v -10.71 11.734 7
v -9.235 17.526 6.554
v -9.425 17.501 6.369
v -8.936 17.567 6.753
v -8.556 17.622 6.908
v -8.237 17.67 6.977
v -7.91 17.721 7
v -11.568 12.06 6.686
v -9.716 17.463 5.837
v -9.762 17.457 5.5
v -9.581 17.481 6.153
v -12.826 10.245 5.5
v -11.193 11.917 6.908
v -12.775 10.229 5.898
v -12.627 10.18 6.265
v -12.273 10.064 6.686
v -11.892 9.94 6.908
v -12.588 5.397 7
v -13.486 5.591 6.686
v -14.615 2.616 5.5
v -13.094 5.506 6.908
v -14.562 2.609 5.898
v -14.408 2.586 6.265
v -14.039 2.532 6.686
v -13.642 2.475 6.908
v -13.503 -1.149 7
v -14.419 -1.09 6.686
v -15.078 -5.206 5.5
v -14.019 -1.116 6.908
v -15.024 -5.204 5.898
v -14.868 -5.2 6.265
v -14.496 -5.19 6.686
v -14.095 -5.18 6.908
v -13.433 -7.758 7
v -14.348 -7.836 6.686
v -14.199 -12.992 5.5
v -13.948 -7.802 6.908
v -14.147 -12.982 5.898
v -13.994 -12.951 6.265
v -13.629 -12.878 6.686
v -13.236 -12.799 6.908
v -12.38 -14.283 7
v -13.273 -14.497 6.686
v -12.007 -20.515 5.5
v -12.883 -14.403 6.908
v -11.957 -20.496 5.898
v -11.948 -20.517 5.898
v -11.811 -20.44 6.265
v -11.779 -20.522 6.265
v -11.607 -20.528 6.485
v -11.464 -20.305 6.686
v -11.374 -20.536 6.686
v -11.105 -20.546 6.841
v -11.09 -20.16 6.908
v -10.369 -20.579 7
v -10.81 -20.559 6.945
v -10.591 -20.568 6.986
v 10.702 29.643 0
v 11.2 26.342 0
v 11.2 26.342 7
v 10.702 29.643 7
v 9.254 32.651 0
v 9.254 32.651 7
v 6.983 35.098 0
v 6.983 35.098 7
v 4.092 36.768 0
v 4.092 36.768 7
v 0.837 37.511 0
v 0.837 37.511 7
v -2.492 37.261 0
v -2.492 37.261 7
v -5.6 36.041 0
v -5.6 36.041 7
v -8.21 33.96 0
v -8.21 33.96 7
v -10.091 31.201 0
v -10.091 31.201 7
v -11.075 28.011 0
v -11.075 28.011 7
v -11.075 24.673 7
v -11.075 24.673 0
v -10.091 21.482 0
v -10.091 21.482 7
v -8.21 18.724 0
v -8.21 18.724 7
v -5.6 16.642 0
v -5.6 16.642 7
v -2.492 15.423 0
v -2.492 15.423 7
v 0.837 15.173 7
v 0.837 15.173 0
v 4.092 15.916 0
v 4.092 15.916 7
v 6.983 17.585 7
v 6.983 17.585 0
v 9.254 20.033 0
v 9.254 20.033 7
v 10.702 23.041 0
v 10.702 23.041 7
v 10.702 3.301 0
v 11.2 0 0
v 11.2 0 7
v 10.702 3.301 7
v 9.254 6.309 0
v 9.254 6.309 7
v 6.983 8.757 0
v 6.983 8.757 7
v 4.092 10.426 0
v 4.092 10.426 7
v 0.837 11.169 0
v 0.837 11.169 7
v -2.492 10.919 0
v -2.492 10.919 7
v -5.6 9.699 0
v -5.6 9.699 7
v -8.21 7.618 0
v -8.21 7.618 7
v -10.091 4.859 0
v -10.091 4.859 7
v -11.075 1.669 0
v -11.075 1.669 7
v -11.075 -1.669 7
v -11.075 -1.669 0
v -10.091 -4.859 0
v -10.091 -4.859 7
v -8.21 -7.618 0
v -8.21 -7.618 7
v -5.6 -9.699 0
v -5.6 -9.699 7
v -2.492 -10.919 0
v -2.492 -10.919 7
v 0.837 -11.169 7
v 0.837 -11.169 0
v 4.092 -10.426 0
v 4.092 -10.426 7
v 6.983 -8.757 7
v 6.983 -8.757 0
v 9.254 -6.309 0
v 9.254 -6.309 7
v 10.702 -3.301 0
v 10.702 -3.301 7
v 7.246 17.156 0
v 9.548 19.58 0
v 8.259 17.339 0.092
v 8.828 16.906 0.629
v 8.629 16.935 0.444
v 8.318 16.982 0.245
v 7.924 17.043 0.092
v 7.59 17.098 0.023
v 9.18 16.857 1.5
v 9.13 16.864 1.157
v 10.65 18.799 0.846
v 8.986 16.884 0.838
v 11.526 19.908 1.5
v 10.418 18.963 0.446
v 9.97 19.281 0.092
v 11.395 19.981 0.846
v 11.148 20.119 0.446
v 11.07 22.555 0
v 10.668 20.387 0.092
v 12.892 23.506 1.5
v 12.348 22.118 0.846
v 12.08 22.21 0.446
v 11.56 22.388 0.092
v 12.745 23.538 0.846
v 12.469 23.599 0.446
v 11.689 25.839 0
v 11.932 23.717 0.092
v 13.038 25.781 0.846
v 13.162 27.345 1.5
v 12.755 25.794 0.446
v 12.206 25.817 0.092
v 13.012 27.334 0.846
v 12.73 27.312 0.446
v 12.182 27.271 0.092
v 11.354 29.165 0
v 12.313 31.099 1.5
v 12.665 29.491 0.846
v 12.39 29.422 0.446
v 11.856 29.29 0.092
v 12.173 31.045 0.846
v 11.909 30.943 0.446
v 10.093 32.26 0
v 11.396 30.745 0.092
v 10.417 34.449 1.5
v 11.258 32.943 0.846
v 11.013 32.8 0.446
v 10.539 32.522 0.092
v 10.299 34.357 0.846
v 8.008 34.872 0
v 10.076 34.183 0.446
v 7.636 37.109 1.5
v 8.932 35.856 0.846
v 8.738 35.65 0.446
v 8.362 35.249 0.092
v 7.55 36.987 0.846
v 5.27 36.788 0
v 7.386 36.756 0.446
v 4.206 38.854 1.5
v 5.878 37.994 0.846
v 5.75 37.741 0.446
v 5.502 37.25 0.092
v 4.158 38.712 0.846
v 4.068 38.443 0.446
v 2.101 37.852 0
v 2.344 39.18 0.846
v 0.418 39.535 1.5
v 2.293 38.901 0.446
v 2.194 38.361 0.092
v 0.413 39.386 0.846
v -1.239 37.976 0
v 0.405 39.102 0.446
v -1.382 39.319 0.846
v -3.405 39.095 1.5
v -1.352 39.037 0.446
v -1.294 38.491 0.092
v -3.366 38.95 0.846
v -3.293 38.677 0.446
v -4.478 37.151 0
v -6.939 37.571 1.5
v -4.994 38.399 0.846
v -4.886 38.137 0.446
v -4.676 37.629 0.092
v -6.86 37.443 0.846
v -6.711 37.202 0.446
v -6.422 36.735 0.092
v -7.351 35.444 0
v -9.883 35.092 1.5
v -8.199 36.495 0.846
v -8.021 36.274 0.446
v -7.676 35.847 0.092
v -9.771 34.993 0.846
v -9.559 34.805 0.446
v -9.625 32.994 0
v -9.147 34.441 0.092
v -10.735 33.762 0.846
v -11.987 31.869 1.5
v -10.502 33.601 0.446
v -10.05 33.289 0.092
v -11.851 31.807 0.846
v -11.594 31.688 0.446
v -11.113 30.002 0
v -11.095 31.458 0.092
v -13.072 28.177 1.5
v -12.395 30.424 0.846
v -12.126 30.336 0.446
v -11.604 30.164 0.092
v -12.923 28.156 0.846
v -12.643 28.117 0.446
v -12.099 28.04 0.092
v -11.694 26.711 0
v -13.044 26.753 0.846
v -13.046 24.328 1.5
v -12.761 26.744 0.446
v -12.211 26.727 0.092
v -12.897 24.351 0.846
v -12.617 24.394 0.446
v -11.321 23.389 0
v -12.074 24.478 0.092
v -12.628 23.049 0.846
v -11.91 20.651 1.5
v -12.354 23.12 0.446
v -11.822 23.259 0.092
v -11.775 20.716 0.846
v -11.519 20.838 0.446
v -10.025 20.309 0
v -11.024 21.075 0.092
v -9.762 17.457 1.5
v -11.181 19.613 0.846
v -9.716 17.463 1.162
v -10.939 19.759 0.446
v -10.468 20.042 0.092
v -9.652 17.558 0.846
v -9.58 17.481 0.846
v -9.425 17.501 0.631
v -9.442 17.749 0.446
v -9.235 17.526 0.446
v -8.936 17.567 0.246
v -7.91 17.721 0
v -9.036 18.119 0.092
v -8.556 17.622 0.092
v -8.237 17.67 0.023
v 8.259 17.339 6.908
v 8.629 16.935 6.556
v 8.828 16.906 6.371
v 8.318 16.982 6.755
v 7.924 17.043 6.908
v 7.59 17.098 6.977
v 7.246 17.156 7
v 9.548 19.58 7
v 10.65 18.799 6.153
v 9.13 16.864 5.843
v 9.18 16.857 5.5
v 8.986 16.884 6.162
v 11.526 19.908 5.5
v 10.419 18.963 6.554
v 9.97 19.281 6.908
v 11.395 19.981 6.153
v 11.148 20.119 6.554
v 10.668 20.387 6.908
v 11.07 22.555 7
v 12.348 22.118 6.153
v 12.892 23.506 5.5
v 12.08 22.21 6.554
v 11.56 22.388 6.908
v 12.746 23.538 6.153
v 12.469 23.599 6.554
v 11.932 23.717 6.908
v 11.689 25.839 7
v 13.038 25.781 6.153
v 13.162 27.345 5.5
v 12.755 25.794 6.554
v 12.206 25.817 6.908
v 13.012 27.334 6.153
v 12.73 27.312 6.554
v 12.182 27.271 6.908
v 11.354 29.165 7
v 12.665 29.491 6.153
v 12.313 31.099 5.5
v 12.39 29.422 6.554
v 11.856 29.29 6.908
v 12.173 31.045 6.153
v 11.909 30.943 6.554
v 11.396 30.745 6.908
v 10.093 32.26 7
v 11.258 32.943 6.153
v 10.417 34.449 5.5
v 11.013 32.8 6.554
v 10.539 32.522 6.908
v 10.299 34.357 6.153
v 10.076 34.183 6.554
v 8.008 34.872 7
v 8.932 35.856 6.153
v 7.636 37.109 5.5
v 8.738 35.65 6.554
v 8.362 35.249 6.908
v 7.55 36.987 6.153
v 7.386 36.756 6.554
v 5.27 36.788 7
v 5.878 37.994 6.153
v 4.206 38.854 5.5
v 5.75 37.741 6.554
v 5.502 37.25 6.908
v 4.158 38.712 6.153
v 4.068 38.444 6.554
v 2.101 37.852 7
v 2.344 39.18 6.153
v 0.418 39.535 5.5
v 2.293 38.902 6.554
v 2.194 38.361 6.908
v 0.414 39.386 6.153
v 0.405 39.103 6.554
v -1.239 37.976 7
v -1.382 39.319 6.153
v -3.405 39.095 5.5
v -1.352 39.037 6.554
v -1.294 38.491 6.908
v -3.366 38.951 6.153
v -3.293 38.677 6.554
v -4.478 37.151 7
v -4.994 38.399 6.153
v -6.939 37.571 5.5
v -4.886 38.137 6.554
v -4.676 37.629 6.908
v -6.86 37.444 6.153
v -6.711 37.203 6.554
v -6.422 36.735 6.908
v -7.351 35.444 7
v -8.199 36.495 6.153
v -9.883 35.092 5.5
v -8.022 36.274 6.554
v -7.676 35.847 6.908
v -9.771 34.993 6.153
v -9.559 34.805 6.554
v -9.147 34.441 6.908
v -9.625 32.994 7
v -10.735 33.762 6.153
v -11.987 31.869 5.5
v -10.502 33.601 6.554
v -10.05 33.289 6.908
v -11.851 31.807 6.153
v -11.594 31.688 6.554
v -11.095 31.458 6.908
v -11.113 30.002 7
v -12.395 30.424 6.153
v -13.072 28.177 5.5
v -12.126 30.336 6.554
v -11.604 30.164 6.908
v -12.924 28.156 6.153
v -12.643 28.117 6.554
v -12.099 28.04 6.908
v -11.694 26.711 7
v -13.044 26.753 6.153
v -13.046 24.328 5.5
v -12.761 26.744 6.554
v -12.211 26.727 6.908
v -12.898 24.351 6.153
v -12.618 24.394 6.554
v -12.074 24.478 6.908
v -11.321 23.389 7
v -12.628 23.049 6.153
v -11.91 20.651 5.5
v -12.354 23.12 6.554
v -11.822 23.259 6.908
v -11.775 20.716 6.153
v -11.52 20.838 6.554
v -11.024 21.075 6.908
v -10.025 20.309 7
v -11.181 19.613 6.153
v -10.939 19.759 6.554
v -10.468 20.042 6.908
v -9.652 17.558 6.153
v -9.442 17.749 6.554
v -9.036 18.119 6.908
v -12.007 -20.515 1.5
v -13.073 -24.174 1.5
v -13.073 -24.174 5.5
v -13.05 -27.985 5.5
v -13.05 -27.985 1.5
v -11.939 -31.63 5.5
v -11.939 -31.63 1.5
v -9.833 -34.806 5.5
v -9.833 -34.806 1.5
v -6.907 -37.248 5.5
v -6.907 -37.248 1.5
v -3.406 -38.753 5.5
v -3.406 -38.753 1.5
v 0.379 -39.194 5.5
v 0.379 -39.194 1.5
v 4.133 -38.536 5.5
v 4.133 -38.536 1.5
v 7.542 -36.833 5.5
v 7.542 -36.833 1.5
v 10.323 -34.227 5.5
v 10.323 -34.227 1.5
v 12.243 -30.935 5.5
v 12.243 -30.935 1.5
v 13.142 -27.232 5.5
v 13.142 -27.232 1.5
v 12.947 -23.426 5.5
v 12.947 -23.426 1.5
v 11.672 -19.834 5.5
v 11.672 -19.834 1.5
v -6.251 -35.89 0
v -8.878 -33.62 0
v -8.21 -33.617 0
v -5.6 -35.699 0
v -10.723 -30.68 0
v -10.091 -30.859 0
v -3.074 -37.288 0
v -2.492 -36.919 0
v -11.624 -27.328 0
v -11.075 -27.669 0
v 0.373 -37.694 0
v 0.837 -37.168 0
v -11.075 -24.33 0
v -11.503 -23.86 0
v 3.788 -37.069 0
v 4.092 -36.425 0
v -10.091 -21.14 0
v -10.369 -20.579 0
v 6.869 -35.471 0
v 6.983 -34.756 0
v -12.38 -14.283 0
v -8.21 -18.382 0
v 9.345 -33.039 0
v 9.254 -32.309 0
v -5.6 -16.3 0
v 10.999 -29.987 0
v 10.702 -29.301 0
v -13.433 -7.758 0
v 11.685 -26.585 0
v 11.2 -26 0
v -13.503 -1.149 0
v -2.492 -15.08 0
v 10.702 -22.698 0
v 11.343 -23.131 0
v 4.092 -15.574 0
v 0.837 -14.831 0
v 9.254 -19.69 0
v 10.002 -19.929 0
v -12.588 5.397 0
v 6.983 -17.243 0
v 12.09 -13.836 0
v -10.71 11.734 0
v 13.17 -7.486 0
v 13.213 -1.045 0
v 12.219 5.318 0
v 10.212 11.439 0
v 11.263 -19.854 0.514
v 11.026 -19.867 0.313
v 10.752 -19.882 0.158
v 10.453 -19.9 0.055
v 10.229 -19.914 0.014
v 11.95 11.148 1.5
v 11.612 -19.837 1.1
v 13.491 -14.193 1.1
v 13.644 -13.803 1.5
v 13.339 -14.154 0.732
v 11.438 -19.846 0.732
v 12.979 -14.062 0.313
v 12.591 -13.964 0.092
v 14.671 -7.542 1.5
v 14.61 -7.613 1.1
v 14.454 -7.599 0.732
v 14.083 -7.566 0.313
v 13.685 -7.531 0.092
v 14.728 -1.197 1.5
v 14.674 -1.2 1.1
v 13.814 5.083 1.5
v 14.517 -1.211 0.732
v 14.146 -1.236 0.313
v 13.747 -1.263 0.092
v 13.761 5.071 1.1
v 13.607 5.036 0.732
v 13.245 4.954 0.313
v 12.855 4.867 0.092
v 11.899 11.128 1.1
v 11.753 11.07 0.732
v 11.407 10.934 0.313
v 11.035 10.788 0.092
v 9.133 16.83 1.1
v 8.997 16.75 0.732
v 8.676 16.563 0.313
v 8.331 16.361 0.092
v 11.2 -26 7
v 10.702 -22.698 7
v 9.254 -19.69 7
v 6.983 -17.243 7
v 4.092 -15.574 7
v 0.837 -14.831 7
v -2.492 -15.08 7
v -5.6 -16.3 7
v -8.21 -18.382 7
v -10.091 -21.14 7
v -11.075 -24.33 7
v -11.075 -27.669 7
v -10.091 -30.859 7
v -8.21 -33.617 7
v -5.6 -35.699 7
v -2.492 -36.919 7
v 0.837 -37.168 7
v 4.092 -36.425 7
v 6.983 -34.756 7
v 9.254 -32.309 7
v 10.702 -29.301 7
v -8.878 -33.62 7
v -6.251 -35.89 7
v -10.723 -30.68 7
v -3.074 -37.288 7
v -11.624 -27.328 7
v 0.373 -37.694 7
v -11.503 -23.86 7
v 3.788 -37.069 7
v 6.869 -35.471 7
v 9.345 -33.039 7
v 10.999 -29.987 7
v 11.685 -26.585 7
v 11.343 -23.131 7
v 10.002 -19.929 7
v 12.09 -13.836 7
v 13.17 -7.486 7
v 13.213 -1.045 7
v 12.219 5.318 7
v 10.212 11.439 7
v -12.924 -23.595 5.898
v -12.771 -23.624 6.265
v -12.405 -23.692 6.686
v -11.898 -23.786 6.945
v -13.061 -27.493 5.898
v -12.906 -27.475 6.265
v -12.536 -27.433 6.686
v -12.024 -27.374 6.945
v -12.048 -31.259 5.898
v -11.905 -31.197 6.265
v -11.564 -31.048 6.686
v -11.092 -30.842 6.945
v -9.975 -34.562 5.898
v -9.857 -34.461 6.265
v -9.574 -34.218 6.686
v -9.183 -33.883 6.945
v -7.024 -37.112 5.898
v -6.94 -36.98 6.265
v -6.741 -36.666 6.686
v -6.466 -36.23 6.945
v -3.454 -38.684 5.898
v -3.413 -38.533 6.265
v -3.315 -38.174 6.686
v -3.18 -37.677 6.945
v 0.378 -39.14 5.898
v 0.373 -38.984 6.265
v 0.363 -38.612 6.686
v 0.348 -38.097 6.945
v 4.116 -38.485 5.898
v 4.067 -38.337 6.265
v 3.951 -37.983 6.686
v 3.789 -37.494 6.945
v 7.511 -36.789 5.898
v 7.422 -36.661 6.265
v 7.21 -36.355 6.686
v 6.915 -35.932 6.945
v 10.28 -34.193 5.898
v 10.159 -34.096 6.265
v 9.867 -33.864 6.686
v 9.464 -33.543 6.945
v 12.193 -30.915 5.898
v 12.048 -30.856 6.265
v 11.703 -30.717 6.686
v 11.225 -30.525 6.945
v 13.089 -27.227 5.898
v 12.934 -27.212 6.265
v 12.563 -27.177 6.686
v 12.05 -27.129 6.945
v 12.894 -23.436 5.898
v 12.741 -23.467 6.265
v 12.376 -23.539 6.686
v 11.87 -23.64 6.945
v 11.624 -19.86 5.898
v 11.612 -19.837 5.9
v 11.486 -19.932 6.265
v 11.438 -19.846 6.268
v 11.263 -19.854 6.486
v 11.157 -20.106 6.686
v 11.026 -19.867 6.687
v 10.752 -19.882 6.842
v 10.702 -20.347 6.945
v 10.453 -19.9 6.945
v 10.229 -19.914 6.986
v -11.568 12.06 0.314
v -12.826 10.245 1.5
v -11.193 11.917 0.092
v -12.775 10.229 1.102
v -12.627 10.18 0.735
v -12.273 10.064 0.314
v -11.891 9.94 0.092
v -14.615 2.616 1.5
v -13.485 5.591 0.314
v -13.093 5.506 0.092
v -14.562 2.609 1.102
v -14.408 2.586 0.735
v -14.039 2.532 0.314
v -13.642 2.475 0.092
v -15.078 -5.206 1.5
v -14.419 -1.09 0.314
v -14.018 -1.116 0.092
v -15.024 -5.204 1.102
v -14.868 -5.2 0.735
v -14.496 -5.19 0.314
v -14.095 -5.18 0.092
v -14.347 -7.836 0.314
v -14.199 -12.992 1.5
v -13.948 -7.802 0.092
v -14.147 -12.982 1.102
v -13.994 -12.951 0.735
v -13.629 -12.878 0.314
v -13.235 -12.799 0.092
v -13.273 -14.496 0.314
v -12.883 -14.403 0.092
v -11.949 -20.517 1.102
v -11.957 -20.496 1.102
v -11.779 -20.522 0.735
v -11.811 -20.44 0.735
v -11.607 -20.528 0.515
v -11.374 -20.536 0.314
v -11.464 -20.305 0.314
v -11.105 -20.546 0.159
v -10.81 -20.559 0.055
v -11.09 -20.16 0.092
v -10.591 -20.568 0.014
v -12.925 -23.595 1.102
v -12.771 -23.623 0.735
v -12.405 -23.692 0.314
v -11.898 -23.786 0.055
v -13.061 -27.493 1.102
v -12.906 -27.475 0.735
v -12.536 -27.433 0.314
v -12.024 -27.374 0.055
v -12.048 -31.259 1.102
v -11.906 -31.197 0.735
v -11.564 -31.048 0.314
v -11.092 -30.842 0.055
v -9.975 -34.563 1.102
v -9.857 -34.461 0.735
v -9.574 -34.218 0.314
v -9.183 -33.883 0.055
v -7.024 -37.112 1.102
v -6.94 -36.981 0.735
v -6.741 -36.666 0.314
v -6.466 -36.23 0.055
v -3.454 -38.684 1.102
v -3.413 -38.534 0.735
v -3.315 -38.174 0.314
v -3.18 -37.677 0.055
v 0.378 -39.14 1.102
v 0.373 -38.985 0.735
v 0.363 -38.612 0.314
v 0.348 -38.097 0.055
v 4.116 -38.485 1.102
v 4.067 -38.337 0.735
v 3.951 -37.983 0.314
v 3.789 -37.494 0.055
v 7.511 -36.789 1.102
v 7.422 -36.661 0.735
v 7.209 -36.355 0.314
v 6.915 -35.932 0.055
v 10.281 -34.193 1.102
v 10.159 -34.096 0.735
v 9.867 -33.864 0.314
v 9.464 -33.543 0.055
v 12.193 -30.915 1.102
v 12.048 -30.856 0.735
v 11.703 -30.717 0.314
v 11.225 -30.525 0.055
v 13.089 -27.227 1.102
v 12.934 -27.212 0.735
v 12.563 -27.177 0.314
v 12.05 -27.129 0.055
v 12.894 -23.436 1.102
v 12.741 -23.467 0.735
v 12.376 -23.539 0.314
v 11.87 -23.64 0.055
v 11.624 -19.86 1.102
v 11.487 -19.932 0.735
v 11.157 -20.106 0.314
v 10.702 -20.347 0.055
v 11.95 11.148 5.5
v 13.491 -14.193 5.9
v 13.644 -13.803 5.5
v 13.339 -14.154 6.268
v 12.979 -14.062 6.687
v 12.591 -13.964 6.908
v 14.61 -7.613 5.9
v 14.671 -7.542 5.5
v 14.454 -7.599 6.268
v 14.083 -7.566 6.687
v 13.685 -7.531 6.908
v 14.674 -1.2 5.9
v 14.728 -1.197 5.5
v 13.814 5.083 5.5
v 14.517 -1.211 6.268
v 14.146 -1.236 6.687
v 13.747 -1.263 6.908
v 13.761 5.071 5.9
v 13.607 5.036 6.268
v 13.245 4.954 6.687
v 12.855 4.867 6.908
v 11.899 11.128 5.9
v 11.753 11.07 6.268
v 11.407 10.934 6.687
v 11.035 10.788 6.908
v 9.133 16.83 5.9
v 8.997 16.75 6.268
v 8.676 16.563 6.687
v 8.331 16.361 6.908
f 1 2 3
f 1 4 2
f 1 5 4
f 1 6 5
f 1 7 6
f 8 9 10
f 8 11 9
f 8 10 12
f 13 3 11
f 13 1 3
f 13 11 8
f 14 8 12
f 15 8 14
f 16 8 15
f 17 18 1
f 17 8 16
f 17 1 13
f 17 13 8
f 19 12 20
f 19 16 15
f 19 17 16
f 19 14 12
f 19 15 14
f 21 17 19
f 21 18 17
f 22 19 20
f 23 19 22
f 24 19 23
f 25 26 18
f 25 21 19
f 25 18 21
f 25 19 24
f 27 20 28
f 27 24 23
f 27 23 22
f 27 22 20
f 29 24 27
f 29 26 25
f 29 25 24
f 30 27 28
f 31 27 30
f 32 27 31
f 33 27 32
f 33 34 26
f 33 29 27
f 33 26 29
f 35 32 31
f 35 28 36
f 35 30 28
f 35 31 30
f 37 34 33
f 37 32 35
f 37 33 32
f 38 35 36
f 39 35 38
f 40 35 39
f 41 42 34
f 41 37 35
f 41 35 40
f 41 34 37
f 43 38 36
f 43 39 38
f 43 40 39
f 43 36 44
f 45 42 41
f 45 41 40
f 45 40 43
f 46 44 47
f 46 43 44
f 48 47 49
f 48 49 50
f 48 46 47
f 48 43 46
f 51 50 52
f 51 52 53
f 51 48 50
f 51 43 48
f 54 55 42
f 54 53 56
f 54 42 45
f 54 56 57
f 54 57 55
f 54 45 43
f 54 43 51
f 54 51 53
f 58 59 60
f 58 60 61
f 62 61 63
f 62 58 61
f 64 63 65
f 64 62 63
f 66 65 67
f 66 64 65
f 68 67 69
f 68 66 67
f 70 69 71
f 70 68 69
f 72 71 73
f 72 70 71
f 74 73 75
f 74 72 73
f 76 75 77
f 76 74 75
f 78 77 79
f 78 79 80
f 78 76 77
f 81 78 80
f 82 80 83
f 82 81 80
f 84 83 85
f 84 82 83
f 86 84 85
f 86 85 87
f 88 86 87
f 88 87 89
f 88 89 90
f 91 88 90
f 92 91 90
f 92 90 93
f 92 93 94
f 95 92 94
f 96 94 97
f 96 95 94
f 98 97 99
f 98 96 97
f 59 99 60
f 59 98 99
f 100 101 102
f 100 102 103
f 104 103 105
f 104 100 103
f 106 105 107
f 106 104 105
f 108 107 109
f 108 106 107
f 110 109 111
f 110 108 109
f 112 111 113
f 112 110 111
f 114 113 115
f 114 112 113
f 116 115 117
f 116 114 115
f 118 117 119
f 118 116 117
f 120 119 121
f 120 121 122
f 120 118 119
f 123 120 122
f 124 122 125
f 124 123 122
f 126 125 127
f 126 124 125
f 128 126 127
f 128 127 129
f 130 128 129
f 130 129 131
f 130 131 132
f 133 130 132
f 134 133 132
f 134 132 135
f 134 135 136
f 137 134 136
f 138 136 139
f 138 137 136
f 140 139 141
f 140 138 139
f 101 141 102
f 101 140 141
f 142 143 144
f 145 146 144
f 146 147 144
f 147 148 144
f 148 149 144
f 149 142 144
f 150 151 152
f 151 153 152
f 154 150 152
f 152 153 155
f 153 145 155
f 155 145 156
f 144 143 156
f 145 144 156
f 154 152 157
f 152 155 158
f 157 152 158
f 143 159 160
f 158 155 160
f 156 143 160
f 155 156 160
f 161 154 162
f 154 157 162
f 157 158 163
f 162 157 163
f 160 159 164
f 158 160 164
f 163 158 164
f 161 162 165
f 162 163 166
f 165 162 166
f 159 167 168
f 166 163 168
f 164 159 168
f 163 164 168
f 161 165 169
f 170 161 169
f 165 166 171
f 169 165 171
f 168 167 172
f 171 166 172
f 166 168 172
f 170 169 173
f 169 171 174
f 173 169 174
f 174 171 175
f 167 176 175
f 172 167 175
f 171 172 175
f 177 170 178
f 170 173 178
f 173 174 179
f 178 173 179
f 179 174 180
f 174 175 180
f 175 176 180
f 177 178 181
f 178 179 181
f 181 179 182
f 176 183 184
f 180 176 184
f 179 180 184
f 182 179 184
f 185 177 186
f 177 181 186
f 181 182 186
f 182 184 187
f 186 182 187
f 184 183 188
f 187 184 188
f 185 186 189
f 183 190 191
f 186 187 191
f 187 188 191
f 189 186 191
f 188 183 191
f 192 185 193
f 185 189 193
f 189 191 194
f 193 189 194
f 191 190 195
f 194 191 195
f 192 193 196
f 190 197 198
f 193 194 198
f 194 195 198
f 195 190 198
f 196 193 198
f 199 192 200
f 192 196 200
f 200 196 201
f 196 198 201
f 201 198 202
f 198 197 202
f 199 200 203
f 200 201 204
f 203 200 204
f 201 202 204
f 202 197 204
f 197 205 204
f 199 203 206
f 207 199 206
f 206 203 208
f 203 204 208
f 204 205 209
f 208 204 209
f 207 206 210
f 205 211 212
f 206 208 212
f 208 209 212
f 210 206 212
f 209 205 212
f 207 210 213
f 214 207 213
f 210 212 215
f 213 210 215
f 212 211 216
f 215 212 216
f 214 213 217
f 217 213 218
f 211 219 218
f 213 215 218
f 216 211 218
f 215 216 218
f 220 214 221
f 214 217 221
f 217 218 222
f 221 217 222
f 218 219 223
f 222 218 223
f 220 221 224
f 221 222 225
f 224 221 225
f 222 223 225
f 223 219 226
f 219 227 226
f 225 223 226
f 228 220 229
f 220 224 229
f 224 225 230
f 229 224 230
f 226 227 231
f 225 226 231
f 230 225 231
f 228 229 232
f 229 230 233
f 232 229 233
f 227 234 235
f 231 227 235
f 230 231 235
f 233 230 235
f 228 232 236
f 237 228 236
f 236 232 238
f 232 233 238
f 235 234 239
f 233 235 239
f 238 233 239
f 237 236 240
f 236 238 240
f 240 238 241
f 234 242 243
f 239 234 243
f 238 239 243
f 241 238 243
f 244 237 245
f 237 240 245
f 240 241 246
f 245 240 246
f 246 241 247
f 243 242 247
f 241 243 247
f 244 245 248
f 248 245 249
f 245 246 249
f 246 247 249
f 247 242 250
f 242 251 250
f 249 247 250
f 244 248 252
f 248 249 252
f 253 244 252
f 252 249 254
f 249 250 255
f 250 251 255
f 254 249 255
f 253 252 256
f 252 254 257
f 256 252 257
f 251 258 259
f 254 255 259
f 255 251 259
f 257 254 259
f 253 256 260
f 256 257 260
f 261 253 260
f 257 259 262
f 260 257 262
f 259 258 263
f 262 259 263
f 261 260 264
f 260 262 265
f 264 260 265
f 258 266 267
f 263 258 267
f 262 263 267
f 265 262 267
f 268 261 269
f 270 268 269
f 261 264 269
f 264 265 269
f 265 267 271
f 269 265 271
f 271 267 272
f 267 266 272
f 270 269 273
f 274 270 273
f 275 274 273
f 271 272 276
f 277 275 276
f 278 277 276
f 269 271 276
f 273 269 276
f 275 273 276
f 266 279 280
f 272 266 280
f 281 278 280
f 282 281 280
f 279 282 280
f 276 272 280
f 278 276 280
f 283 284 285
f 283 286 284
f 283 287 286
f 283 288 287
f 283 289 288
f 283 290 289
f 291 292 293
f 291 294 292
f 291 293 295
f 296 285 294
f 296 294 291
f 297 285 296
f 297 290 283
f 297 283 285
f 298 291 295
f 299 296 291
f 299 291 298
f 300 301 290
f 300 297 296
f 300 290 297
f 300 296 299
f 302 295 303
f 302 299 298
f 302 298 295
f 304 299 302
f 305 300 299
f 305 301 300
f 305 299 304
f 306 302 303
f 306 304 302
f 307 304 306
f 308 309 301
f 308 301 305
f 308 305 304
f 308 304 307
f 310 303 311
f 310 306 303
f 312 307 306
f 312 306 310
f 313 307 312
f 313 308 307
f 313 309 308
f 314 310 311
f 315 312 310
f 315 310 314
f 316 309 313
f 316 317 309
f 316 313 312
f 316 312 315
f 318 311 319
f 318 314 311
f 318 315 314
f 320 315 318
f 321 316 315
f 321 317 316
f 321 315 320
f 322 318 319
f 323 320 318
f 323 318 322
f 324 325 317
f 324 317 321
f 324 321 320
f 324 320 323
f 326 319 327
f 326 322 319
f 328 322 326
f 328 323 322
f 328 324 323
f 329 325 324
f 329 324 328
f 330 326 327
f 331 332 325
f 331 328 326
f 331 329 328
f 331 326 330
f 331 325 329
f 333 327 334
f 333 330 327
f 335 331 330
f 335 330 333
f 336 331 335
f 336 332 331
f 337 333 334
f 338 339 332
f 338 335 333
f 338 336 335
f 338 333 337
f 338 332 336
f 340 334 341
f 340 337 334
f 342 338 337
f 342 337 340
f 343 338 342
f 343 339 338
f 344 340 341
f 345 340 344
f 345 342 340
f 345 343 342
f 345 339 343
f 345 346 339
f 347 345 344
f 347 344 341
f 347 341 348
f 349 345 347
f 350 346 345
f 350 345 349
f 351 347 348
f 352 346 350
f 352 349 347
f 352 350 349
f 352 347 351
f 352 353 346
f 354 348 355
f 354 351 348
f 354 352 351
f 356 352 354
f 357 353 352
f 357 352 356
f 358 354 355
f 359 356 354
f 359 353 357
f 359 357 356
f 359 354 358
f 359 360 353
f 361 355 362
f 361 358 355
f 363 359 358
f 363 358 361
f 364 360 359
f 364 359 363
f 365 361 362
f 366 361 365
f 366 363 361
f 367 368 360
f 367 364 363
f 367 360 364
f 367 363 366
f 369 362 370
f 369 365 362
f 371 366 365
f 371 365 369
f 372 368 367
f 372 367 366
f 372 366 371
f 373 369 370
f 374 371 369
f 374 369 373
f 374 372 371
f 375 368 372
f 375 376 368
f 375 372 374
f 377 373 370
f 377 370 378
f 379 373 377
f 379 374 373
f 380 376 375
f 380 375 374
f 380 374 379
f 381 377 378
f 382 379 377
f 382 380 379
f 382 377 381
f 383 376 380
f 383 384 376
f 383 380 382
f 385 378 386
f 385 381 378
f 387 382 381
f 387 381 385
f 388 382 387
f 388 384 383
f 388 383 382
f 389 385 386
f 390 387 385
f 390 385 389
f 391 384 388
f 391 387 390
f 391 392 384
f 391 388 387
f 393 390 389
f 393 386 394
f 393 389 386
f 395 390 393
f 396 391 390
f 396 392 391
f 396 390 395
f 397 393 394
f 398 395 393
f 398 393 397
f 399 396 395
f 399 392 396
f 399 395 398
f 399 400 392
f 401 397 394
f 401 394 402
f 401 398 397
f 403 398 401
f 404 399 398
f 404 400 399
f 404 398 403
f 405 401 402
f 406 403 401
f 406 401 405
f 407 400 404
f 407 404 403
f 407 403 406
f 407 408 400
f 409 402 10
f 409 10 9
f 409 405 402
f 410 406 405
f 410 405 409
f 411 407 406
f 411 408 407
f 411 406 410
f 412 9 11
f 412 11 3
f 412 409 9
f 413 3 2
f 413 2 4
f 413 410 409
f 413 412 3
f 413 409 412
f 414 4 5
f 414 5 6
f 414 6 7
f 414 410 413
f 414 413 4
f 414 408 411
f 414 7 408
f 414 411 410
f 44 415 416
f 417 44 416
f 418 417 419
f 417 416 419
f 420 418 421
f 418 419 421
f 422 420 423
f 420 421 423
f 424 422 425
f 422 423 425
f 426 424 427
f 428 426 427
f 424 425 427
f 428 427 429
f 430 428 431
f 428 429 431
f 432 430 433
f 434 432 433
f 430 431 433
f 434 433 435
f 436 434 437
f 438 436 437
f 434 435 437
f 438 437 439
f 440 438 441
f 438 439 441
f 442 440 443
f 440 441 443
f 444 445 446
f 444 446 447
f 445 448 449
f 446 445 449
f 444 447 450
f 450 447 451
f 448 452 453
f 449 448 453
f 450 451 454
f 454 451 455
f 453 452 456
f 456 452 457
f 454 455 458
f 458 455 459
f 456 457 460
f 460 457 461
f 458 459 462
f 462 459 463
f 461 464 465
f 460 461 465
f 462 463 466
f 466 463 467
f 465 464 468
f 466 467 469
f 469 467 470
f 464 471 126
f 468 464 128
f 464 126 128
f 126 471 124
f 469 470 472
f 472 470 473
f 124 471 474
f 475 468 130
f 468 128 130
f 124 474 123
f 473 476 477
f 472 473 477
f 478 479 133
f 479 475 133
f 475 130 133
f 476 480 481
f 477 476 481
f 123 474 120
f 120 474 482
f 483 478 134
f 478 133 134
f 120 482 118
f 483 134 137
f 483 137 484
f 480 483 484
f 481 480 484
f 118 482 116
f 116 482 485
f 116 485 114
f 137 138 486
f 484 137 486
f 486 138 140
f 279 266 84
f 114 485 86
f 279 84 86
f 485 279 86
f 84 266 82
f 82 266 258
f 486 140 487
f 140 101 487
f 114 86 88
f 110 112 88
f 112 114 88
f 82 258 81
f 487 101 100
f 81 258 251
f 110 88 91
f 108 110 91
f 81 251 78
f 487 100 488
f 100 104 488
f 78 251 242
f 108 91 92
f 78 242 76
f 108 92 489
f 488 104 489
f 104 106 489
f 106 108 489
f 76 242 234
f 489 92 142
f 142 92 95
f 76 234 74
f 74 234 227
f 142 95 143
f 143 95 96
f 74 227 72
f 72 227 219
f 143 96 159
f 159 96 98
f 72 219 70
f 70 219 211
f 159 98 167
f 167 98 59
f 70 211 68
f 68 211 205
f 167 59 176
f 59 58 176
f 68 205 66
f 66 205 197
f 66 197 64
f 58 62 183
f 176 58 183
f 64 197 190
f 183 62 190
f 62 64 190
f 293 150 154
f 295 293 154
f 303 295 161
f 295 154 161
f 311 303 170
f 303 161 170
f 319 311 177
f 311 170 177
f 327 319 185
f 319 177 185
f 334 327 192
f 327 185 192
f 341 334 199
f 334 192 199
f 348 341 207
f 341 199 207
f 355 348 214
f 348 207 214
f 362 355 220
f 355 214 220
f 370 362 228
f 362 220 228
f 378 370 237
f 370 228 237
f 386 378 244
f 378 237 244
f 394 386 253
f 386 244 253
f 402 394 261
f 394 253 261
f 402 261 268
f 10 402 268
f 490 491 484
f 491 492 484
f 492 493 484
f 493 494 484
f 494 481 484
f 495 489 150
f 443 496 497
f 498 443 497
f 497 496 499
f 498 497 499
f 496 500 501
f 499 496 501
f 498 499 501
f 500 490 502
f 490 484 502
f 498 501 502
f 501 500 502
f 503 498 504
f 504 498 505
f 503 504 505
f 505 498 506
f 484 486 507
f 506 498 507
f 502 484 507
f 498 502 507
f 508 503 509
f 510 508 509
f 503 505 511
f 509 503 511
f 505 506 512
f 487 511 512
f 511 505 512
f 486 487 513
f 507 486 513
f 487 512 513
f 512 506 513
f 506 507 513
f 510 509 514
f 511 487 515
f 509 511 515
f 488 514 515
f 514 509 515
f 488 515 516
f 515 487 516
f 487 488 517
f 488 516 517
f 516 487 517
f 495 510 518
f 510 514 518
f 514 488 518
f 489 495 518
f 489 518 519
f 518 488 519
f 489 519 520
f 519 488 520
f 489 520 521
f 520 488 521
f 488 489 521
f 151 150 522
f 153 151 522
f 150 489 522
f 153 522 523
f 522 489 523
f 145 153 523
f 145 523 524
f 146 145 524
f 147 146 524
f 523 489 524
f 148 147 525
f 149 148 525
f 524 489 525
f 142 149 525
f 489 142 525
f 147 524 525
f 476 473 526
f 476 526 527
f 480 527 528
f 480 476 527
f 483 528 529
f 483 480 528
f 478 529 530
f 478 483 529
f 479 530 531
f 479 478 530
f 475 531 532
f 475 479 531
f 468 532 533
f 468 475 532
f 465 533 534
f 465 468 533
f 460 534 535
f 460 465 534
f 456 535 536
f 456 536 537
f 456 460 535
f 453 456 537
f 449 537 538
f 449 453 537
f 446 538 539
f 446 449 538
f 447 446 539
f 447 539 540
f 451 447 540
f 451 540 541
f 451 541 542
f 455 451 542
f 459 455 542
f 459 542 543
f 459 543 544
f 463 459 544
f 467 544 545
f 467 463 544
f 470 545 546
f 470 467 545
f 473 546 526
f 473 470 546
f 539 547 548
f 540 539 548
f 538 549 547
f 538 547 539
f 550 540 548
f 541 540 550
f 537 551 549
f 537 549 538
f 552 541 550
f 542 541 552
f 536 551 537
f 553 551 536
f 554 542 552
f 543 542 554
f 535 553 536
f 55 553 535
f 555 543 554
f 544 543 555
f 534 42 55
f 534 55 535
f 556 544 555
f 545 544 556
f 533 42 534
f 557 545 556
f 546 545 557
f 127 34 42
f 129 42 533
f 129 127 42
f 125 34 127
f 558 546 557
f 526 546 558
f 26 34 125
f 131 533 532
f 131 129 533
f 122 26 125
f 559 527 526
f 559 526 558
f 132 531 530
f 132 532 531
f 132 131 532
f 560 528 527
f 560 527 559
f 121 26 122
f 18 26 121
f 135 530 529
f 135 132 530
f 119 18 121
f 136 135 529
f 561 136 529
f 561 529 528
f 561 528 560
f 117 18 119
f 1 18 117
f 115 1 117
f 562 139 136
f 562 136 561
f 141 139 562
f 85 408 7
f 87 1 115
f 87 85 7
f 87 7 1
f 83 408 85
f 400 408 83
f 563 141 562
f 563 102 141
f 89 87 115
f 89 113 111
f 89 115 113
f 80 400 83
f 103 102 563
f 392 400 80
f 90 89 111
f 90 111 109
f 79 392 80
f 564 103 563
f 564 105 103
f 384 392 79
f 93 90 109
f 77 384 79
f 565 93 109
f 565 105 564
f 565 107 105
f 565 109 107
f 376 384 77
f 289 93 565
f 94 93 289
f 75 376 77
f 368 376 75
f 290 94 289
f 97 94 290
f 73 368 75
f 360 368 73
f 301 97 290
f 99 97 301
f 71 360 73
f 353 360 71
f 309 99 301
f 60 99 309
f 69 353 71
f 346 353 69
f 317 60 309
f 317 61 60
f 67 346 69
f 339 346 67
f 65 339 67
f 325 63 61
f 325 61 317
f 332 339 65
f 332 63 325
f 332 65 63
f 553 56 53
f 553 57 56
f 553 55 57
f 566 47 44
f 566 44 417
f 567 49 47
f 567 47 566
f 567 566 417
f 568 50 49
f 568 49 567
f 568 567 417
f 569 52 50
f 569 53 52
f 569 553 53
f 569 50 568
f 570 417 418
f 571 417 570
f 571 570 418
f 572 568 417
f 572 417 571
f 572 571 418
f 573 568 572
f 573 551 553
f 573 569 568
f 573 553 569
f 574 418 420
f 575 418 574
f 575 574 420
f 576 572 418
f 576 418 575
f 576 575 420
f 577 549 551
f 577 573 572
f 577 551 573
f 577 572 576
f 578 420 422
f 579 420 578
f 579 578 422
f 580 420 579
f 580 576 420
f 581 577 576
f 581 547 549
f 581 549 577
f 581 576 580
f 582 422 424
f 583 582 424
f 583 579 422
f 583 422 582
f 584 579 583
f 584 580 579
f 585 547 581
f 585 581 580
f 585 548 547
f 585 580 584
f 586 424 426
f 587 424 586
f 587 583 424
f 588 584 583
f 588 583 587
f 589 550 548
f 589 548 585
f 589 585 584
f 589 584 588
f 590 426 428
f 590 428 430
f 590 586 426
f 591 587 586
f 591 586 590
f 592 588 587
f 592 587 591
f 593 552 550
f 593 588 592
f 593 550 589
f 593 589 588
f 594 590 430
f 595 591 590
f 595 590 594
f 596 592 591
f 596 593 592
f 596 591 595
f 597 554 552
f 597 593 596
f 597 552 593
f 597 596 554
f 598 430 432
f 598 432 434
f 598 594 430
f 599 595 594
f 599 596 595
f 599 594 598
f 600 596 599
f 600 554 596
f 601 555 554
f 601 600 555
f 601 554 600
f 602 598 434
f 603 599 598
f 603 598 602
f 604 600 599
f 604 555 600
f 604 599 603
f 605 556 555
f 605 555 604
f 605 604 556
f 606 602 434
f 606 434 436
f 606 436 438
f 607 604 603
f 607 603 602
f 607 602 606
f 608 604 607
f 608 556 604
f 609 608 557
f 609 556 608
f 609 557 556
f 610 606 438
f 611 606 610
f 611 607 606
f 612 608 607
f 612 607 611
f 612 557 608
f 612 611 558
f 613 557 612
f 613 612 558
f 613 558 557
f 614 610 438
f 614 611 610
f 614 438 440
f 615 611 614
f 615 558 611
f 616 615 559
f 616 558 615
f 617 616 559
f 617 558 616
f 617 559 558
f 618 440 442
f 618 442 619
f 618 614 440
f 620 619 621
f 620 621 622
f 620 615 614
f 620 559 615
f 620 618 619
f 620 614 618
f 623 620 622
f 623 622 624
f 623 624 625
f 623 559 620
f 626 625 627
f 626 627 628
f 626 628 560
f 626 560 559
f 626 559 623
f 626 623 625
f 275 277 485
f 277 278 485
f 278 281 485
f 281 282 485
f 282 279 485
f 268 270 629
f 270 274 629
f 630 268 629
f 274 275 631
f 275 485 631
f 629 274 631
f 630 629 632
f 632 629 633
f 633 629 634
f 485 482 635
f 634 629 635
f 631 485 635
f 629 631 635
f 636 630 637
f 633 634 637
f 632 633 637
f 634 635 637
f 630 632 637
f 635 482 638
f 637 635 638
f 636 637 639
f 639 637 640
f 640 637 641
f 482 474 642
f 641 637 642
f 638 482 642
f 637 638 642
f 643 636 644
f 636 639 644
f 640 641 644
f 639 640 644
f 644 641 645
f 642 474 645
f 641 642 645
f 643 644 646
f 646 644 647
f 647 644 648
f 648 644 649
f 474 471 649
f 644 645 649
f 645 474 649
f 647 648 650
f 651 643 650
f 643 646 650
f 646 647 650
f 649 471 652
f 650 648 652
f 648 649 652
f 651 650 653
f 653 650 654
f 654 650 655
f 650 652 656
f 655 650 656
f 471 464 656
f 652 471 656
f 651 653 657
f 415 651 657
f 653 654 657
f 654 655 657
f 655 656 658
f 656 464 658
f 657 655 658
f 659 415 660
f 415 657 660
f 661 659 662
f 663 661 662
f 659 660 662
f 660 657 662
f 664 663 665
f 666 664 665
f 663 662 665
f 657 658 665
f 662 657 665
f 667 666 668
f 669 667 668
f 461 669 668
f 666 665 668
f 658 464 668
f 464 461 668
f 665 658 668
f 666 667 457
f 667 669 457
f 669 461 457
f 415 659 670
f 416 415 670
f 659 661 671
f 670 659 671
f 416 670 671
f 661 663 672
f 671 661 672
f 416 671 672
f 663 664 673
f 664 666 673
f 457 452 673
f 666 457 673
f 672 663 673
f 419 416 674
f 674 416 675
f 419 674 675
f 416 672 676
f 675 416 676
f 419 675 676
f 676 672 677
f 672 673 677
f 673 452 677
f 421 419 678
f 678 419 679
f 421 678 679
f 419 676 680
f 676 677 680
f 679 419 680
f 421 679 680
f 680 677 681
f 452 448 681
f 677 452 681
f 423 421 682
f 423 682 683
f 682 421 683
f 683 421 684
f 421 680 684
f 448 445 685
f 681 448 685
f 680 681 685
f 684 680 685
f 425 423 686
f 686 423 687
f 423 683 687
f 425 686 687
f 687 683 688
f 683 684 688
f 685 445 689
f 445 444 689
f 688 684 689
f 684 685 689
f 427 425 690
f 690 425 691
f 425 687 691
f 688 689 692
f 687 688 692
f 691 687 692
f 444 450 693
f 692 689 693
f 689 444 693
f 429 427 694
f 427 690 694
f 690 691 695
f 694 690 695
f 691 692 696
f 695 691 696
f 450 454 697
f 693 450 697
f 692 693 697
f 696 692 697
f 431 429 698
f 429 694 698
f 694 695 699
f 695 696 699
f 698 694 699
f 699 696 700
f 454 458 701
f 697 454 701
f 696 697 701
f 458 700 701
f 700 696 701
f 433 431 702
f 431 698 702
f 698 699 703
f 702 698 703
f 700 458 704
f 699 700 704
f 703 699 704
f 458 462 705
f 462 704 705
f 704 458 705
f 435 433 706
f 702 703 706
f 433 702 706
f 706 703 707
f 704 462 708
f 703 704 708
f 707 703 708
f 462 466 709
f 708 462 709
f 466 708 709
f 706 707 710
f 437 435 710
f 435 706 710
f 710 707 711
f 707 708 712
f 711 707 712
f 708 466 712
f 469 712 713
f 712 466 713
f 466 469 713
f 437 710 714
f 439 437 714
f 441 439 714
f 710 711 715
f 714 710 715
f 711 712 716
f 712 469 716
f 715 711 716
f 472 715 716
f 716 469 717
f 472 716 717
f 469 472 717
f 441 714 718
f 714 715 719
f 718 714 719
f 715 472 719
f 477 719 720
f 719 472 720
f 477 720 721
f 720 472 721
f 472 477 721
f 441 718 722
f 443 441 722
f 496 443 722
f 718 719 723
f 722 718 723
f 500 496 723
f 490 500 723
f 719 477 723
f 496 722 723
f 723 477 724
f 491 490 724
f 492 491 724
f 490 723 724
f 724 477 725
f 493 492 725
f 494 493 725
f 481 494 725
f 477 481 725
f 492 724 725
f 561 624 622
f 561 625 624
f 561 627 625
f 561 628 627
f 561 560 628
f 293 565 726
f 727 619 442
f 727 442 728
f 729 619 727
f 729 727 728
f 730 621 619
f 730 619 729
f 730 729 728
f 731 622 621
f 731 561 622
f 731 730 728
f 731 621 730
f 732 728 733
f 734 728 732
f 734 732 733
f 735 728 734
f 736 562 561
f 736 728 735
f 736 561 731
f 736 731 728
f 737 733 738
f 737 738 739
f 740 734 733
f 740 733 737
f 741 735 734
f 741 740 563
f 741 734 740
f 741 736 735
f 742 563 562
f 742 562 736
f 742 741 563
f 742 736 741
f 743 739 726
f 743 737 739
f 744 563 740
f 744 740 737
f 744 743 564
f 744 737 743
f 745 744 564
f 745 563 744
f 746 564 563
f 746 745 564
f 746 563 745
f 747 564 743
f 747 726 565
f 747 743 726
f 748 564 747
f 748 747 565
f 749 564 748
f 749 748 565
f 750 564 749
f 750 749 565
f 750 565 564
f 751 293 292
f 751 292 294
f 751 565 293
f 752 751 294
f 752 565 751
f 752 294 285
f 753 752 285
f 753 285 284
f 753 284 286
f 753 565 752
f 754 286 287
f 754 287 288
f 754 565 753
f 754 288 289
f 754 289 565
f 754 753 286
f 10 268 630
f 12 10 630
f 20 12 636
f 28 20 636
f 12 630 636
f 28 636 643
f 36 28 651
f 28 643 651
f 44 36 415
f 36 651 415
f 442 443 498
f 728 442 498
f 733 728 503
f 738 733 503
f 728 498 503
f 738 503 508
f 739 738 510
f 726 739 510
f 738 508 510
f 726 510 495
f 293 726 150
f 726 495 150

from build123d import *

# Parameters (mm, degrees)
F0_R     = 11.2
F1_DEPTH = 7
F2_R     = 1.5


with BuildPart() as f1:
    # F0 (on Top) → F1 (new body)
    with BuildSketch(Plane.XY):
        with BuildLine():
            ThreePointArc((-9.762461, 17.457459), (-15.01398, -1.284826), (-12.006769, -20.515228))
            ThreePointArc((-12.006769, -20.515228), (0.379346, -39.194072), (11.671847, -19.834462))
            ThreePointArc((11.671847, -19.834462), (14.727794, -1.196617), (9.180124, 16.856954))
            ThreePointArc((9.180124, 16.856954), (0.418247, 39.535332), (-9.762461, 17.457459))
        make_face()
        with Locations((0, -25.999524)):
            Circle(F0_R, mode=Mode.SUBTRACT)
        Circle(F0_R, mode=Mode.SUBTRACT)
        with Locations((0, 26.34196)):
            Circle(F0_R, mode=Mode.SUBTRACT)
    extrude(amount=F1_DEPTH)

    # F2
    f2_edges = [f1.edges().sort_by_distance(p)[0] for p in [
        (0.379346, -39.194072, 7),
        (0.379346, -39.194072, 0),
        (14.727794, -1.196617, 7),
        (14.727794, -1.196617, 0),
        (0.418247, 39.535332, 7),
        (0.418247, 39.535332, 0),
        (-15.01398, -1.284826, 7),
        (-15.01398, -1.284826, 0),
    ]]
    fillet(f2_edges, radius=F2_R)


solid = f1.part
